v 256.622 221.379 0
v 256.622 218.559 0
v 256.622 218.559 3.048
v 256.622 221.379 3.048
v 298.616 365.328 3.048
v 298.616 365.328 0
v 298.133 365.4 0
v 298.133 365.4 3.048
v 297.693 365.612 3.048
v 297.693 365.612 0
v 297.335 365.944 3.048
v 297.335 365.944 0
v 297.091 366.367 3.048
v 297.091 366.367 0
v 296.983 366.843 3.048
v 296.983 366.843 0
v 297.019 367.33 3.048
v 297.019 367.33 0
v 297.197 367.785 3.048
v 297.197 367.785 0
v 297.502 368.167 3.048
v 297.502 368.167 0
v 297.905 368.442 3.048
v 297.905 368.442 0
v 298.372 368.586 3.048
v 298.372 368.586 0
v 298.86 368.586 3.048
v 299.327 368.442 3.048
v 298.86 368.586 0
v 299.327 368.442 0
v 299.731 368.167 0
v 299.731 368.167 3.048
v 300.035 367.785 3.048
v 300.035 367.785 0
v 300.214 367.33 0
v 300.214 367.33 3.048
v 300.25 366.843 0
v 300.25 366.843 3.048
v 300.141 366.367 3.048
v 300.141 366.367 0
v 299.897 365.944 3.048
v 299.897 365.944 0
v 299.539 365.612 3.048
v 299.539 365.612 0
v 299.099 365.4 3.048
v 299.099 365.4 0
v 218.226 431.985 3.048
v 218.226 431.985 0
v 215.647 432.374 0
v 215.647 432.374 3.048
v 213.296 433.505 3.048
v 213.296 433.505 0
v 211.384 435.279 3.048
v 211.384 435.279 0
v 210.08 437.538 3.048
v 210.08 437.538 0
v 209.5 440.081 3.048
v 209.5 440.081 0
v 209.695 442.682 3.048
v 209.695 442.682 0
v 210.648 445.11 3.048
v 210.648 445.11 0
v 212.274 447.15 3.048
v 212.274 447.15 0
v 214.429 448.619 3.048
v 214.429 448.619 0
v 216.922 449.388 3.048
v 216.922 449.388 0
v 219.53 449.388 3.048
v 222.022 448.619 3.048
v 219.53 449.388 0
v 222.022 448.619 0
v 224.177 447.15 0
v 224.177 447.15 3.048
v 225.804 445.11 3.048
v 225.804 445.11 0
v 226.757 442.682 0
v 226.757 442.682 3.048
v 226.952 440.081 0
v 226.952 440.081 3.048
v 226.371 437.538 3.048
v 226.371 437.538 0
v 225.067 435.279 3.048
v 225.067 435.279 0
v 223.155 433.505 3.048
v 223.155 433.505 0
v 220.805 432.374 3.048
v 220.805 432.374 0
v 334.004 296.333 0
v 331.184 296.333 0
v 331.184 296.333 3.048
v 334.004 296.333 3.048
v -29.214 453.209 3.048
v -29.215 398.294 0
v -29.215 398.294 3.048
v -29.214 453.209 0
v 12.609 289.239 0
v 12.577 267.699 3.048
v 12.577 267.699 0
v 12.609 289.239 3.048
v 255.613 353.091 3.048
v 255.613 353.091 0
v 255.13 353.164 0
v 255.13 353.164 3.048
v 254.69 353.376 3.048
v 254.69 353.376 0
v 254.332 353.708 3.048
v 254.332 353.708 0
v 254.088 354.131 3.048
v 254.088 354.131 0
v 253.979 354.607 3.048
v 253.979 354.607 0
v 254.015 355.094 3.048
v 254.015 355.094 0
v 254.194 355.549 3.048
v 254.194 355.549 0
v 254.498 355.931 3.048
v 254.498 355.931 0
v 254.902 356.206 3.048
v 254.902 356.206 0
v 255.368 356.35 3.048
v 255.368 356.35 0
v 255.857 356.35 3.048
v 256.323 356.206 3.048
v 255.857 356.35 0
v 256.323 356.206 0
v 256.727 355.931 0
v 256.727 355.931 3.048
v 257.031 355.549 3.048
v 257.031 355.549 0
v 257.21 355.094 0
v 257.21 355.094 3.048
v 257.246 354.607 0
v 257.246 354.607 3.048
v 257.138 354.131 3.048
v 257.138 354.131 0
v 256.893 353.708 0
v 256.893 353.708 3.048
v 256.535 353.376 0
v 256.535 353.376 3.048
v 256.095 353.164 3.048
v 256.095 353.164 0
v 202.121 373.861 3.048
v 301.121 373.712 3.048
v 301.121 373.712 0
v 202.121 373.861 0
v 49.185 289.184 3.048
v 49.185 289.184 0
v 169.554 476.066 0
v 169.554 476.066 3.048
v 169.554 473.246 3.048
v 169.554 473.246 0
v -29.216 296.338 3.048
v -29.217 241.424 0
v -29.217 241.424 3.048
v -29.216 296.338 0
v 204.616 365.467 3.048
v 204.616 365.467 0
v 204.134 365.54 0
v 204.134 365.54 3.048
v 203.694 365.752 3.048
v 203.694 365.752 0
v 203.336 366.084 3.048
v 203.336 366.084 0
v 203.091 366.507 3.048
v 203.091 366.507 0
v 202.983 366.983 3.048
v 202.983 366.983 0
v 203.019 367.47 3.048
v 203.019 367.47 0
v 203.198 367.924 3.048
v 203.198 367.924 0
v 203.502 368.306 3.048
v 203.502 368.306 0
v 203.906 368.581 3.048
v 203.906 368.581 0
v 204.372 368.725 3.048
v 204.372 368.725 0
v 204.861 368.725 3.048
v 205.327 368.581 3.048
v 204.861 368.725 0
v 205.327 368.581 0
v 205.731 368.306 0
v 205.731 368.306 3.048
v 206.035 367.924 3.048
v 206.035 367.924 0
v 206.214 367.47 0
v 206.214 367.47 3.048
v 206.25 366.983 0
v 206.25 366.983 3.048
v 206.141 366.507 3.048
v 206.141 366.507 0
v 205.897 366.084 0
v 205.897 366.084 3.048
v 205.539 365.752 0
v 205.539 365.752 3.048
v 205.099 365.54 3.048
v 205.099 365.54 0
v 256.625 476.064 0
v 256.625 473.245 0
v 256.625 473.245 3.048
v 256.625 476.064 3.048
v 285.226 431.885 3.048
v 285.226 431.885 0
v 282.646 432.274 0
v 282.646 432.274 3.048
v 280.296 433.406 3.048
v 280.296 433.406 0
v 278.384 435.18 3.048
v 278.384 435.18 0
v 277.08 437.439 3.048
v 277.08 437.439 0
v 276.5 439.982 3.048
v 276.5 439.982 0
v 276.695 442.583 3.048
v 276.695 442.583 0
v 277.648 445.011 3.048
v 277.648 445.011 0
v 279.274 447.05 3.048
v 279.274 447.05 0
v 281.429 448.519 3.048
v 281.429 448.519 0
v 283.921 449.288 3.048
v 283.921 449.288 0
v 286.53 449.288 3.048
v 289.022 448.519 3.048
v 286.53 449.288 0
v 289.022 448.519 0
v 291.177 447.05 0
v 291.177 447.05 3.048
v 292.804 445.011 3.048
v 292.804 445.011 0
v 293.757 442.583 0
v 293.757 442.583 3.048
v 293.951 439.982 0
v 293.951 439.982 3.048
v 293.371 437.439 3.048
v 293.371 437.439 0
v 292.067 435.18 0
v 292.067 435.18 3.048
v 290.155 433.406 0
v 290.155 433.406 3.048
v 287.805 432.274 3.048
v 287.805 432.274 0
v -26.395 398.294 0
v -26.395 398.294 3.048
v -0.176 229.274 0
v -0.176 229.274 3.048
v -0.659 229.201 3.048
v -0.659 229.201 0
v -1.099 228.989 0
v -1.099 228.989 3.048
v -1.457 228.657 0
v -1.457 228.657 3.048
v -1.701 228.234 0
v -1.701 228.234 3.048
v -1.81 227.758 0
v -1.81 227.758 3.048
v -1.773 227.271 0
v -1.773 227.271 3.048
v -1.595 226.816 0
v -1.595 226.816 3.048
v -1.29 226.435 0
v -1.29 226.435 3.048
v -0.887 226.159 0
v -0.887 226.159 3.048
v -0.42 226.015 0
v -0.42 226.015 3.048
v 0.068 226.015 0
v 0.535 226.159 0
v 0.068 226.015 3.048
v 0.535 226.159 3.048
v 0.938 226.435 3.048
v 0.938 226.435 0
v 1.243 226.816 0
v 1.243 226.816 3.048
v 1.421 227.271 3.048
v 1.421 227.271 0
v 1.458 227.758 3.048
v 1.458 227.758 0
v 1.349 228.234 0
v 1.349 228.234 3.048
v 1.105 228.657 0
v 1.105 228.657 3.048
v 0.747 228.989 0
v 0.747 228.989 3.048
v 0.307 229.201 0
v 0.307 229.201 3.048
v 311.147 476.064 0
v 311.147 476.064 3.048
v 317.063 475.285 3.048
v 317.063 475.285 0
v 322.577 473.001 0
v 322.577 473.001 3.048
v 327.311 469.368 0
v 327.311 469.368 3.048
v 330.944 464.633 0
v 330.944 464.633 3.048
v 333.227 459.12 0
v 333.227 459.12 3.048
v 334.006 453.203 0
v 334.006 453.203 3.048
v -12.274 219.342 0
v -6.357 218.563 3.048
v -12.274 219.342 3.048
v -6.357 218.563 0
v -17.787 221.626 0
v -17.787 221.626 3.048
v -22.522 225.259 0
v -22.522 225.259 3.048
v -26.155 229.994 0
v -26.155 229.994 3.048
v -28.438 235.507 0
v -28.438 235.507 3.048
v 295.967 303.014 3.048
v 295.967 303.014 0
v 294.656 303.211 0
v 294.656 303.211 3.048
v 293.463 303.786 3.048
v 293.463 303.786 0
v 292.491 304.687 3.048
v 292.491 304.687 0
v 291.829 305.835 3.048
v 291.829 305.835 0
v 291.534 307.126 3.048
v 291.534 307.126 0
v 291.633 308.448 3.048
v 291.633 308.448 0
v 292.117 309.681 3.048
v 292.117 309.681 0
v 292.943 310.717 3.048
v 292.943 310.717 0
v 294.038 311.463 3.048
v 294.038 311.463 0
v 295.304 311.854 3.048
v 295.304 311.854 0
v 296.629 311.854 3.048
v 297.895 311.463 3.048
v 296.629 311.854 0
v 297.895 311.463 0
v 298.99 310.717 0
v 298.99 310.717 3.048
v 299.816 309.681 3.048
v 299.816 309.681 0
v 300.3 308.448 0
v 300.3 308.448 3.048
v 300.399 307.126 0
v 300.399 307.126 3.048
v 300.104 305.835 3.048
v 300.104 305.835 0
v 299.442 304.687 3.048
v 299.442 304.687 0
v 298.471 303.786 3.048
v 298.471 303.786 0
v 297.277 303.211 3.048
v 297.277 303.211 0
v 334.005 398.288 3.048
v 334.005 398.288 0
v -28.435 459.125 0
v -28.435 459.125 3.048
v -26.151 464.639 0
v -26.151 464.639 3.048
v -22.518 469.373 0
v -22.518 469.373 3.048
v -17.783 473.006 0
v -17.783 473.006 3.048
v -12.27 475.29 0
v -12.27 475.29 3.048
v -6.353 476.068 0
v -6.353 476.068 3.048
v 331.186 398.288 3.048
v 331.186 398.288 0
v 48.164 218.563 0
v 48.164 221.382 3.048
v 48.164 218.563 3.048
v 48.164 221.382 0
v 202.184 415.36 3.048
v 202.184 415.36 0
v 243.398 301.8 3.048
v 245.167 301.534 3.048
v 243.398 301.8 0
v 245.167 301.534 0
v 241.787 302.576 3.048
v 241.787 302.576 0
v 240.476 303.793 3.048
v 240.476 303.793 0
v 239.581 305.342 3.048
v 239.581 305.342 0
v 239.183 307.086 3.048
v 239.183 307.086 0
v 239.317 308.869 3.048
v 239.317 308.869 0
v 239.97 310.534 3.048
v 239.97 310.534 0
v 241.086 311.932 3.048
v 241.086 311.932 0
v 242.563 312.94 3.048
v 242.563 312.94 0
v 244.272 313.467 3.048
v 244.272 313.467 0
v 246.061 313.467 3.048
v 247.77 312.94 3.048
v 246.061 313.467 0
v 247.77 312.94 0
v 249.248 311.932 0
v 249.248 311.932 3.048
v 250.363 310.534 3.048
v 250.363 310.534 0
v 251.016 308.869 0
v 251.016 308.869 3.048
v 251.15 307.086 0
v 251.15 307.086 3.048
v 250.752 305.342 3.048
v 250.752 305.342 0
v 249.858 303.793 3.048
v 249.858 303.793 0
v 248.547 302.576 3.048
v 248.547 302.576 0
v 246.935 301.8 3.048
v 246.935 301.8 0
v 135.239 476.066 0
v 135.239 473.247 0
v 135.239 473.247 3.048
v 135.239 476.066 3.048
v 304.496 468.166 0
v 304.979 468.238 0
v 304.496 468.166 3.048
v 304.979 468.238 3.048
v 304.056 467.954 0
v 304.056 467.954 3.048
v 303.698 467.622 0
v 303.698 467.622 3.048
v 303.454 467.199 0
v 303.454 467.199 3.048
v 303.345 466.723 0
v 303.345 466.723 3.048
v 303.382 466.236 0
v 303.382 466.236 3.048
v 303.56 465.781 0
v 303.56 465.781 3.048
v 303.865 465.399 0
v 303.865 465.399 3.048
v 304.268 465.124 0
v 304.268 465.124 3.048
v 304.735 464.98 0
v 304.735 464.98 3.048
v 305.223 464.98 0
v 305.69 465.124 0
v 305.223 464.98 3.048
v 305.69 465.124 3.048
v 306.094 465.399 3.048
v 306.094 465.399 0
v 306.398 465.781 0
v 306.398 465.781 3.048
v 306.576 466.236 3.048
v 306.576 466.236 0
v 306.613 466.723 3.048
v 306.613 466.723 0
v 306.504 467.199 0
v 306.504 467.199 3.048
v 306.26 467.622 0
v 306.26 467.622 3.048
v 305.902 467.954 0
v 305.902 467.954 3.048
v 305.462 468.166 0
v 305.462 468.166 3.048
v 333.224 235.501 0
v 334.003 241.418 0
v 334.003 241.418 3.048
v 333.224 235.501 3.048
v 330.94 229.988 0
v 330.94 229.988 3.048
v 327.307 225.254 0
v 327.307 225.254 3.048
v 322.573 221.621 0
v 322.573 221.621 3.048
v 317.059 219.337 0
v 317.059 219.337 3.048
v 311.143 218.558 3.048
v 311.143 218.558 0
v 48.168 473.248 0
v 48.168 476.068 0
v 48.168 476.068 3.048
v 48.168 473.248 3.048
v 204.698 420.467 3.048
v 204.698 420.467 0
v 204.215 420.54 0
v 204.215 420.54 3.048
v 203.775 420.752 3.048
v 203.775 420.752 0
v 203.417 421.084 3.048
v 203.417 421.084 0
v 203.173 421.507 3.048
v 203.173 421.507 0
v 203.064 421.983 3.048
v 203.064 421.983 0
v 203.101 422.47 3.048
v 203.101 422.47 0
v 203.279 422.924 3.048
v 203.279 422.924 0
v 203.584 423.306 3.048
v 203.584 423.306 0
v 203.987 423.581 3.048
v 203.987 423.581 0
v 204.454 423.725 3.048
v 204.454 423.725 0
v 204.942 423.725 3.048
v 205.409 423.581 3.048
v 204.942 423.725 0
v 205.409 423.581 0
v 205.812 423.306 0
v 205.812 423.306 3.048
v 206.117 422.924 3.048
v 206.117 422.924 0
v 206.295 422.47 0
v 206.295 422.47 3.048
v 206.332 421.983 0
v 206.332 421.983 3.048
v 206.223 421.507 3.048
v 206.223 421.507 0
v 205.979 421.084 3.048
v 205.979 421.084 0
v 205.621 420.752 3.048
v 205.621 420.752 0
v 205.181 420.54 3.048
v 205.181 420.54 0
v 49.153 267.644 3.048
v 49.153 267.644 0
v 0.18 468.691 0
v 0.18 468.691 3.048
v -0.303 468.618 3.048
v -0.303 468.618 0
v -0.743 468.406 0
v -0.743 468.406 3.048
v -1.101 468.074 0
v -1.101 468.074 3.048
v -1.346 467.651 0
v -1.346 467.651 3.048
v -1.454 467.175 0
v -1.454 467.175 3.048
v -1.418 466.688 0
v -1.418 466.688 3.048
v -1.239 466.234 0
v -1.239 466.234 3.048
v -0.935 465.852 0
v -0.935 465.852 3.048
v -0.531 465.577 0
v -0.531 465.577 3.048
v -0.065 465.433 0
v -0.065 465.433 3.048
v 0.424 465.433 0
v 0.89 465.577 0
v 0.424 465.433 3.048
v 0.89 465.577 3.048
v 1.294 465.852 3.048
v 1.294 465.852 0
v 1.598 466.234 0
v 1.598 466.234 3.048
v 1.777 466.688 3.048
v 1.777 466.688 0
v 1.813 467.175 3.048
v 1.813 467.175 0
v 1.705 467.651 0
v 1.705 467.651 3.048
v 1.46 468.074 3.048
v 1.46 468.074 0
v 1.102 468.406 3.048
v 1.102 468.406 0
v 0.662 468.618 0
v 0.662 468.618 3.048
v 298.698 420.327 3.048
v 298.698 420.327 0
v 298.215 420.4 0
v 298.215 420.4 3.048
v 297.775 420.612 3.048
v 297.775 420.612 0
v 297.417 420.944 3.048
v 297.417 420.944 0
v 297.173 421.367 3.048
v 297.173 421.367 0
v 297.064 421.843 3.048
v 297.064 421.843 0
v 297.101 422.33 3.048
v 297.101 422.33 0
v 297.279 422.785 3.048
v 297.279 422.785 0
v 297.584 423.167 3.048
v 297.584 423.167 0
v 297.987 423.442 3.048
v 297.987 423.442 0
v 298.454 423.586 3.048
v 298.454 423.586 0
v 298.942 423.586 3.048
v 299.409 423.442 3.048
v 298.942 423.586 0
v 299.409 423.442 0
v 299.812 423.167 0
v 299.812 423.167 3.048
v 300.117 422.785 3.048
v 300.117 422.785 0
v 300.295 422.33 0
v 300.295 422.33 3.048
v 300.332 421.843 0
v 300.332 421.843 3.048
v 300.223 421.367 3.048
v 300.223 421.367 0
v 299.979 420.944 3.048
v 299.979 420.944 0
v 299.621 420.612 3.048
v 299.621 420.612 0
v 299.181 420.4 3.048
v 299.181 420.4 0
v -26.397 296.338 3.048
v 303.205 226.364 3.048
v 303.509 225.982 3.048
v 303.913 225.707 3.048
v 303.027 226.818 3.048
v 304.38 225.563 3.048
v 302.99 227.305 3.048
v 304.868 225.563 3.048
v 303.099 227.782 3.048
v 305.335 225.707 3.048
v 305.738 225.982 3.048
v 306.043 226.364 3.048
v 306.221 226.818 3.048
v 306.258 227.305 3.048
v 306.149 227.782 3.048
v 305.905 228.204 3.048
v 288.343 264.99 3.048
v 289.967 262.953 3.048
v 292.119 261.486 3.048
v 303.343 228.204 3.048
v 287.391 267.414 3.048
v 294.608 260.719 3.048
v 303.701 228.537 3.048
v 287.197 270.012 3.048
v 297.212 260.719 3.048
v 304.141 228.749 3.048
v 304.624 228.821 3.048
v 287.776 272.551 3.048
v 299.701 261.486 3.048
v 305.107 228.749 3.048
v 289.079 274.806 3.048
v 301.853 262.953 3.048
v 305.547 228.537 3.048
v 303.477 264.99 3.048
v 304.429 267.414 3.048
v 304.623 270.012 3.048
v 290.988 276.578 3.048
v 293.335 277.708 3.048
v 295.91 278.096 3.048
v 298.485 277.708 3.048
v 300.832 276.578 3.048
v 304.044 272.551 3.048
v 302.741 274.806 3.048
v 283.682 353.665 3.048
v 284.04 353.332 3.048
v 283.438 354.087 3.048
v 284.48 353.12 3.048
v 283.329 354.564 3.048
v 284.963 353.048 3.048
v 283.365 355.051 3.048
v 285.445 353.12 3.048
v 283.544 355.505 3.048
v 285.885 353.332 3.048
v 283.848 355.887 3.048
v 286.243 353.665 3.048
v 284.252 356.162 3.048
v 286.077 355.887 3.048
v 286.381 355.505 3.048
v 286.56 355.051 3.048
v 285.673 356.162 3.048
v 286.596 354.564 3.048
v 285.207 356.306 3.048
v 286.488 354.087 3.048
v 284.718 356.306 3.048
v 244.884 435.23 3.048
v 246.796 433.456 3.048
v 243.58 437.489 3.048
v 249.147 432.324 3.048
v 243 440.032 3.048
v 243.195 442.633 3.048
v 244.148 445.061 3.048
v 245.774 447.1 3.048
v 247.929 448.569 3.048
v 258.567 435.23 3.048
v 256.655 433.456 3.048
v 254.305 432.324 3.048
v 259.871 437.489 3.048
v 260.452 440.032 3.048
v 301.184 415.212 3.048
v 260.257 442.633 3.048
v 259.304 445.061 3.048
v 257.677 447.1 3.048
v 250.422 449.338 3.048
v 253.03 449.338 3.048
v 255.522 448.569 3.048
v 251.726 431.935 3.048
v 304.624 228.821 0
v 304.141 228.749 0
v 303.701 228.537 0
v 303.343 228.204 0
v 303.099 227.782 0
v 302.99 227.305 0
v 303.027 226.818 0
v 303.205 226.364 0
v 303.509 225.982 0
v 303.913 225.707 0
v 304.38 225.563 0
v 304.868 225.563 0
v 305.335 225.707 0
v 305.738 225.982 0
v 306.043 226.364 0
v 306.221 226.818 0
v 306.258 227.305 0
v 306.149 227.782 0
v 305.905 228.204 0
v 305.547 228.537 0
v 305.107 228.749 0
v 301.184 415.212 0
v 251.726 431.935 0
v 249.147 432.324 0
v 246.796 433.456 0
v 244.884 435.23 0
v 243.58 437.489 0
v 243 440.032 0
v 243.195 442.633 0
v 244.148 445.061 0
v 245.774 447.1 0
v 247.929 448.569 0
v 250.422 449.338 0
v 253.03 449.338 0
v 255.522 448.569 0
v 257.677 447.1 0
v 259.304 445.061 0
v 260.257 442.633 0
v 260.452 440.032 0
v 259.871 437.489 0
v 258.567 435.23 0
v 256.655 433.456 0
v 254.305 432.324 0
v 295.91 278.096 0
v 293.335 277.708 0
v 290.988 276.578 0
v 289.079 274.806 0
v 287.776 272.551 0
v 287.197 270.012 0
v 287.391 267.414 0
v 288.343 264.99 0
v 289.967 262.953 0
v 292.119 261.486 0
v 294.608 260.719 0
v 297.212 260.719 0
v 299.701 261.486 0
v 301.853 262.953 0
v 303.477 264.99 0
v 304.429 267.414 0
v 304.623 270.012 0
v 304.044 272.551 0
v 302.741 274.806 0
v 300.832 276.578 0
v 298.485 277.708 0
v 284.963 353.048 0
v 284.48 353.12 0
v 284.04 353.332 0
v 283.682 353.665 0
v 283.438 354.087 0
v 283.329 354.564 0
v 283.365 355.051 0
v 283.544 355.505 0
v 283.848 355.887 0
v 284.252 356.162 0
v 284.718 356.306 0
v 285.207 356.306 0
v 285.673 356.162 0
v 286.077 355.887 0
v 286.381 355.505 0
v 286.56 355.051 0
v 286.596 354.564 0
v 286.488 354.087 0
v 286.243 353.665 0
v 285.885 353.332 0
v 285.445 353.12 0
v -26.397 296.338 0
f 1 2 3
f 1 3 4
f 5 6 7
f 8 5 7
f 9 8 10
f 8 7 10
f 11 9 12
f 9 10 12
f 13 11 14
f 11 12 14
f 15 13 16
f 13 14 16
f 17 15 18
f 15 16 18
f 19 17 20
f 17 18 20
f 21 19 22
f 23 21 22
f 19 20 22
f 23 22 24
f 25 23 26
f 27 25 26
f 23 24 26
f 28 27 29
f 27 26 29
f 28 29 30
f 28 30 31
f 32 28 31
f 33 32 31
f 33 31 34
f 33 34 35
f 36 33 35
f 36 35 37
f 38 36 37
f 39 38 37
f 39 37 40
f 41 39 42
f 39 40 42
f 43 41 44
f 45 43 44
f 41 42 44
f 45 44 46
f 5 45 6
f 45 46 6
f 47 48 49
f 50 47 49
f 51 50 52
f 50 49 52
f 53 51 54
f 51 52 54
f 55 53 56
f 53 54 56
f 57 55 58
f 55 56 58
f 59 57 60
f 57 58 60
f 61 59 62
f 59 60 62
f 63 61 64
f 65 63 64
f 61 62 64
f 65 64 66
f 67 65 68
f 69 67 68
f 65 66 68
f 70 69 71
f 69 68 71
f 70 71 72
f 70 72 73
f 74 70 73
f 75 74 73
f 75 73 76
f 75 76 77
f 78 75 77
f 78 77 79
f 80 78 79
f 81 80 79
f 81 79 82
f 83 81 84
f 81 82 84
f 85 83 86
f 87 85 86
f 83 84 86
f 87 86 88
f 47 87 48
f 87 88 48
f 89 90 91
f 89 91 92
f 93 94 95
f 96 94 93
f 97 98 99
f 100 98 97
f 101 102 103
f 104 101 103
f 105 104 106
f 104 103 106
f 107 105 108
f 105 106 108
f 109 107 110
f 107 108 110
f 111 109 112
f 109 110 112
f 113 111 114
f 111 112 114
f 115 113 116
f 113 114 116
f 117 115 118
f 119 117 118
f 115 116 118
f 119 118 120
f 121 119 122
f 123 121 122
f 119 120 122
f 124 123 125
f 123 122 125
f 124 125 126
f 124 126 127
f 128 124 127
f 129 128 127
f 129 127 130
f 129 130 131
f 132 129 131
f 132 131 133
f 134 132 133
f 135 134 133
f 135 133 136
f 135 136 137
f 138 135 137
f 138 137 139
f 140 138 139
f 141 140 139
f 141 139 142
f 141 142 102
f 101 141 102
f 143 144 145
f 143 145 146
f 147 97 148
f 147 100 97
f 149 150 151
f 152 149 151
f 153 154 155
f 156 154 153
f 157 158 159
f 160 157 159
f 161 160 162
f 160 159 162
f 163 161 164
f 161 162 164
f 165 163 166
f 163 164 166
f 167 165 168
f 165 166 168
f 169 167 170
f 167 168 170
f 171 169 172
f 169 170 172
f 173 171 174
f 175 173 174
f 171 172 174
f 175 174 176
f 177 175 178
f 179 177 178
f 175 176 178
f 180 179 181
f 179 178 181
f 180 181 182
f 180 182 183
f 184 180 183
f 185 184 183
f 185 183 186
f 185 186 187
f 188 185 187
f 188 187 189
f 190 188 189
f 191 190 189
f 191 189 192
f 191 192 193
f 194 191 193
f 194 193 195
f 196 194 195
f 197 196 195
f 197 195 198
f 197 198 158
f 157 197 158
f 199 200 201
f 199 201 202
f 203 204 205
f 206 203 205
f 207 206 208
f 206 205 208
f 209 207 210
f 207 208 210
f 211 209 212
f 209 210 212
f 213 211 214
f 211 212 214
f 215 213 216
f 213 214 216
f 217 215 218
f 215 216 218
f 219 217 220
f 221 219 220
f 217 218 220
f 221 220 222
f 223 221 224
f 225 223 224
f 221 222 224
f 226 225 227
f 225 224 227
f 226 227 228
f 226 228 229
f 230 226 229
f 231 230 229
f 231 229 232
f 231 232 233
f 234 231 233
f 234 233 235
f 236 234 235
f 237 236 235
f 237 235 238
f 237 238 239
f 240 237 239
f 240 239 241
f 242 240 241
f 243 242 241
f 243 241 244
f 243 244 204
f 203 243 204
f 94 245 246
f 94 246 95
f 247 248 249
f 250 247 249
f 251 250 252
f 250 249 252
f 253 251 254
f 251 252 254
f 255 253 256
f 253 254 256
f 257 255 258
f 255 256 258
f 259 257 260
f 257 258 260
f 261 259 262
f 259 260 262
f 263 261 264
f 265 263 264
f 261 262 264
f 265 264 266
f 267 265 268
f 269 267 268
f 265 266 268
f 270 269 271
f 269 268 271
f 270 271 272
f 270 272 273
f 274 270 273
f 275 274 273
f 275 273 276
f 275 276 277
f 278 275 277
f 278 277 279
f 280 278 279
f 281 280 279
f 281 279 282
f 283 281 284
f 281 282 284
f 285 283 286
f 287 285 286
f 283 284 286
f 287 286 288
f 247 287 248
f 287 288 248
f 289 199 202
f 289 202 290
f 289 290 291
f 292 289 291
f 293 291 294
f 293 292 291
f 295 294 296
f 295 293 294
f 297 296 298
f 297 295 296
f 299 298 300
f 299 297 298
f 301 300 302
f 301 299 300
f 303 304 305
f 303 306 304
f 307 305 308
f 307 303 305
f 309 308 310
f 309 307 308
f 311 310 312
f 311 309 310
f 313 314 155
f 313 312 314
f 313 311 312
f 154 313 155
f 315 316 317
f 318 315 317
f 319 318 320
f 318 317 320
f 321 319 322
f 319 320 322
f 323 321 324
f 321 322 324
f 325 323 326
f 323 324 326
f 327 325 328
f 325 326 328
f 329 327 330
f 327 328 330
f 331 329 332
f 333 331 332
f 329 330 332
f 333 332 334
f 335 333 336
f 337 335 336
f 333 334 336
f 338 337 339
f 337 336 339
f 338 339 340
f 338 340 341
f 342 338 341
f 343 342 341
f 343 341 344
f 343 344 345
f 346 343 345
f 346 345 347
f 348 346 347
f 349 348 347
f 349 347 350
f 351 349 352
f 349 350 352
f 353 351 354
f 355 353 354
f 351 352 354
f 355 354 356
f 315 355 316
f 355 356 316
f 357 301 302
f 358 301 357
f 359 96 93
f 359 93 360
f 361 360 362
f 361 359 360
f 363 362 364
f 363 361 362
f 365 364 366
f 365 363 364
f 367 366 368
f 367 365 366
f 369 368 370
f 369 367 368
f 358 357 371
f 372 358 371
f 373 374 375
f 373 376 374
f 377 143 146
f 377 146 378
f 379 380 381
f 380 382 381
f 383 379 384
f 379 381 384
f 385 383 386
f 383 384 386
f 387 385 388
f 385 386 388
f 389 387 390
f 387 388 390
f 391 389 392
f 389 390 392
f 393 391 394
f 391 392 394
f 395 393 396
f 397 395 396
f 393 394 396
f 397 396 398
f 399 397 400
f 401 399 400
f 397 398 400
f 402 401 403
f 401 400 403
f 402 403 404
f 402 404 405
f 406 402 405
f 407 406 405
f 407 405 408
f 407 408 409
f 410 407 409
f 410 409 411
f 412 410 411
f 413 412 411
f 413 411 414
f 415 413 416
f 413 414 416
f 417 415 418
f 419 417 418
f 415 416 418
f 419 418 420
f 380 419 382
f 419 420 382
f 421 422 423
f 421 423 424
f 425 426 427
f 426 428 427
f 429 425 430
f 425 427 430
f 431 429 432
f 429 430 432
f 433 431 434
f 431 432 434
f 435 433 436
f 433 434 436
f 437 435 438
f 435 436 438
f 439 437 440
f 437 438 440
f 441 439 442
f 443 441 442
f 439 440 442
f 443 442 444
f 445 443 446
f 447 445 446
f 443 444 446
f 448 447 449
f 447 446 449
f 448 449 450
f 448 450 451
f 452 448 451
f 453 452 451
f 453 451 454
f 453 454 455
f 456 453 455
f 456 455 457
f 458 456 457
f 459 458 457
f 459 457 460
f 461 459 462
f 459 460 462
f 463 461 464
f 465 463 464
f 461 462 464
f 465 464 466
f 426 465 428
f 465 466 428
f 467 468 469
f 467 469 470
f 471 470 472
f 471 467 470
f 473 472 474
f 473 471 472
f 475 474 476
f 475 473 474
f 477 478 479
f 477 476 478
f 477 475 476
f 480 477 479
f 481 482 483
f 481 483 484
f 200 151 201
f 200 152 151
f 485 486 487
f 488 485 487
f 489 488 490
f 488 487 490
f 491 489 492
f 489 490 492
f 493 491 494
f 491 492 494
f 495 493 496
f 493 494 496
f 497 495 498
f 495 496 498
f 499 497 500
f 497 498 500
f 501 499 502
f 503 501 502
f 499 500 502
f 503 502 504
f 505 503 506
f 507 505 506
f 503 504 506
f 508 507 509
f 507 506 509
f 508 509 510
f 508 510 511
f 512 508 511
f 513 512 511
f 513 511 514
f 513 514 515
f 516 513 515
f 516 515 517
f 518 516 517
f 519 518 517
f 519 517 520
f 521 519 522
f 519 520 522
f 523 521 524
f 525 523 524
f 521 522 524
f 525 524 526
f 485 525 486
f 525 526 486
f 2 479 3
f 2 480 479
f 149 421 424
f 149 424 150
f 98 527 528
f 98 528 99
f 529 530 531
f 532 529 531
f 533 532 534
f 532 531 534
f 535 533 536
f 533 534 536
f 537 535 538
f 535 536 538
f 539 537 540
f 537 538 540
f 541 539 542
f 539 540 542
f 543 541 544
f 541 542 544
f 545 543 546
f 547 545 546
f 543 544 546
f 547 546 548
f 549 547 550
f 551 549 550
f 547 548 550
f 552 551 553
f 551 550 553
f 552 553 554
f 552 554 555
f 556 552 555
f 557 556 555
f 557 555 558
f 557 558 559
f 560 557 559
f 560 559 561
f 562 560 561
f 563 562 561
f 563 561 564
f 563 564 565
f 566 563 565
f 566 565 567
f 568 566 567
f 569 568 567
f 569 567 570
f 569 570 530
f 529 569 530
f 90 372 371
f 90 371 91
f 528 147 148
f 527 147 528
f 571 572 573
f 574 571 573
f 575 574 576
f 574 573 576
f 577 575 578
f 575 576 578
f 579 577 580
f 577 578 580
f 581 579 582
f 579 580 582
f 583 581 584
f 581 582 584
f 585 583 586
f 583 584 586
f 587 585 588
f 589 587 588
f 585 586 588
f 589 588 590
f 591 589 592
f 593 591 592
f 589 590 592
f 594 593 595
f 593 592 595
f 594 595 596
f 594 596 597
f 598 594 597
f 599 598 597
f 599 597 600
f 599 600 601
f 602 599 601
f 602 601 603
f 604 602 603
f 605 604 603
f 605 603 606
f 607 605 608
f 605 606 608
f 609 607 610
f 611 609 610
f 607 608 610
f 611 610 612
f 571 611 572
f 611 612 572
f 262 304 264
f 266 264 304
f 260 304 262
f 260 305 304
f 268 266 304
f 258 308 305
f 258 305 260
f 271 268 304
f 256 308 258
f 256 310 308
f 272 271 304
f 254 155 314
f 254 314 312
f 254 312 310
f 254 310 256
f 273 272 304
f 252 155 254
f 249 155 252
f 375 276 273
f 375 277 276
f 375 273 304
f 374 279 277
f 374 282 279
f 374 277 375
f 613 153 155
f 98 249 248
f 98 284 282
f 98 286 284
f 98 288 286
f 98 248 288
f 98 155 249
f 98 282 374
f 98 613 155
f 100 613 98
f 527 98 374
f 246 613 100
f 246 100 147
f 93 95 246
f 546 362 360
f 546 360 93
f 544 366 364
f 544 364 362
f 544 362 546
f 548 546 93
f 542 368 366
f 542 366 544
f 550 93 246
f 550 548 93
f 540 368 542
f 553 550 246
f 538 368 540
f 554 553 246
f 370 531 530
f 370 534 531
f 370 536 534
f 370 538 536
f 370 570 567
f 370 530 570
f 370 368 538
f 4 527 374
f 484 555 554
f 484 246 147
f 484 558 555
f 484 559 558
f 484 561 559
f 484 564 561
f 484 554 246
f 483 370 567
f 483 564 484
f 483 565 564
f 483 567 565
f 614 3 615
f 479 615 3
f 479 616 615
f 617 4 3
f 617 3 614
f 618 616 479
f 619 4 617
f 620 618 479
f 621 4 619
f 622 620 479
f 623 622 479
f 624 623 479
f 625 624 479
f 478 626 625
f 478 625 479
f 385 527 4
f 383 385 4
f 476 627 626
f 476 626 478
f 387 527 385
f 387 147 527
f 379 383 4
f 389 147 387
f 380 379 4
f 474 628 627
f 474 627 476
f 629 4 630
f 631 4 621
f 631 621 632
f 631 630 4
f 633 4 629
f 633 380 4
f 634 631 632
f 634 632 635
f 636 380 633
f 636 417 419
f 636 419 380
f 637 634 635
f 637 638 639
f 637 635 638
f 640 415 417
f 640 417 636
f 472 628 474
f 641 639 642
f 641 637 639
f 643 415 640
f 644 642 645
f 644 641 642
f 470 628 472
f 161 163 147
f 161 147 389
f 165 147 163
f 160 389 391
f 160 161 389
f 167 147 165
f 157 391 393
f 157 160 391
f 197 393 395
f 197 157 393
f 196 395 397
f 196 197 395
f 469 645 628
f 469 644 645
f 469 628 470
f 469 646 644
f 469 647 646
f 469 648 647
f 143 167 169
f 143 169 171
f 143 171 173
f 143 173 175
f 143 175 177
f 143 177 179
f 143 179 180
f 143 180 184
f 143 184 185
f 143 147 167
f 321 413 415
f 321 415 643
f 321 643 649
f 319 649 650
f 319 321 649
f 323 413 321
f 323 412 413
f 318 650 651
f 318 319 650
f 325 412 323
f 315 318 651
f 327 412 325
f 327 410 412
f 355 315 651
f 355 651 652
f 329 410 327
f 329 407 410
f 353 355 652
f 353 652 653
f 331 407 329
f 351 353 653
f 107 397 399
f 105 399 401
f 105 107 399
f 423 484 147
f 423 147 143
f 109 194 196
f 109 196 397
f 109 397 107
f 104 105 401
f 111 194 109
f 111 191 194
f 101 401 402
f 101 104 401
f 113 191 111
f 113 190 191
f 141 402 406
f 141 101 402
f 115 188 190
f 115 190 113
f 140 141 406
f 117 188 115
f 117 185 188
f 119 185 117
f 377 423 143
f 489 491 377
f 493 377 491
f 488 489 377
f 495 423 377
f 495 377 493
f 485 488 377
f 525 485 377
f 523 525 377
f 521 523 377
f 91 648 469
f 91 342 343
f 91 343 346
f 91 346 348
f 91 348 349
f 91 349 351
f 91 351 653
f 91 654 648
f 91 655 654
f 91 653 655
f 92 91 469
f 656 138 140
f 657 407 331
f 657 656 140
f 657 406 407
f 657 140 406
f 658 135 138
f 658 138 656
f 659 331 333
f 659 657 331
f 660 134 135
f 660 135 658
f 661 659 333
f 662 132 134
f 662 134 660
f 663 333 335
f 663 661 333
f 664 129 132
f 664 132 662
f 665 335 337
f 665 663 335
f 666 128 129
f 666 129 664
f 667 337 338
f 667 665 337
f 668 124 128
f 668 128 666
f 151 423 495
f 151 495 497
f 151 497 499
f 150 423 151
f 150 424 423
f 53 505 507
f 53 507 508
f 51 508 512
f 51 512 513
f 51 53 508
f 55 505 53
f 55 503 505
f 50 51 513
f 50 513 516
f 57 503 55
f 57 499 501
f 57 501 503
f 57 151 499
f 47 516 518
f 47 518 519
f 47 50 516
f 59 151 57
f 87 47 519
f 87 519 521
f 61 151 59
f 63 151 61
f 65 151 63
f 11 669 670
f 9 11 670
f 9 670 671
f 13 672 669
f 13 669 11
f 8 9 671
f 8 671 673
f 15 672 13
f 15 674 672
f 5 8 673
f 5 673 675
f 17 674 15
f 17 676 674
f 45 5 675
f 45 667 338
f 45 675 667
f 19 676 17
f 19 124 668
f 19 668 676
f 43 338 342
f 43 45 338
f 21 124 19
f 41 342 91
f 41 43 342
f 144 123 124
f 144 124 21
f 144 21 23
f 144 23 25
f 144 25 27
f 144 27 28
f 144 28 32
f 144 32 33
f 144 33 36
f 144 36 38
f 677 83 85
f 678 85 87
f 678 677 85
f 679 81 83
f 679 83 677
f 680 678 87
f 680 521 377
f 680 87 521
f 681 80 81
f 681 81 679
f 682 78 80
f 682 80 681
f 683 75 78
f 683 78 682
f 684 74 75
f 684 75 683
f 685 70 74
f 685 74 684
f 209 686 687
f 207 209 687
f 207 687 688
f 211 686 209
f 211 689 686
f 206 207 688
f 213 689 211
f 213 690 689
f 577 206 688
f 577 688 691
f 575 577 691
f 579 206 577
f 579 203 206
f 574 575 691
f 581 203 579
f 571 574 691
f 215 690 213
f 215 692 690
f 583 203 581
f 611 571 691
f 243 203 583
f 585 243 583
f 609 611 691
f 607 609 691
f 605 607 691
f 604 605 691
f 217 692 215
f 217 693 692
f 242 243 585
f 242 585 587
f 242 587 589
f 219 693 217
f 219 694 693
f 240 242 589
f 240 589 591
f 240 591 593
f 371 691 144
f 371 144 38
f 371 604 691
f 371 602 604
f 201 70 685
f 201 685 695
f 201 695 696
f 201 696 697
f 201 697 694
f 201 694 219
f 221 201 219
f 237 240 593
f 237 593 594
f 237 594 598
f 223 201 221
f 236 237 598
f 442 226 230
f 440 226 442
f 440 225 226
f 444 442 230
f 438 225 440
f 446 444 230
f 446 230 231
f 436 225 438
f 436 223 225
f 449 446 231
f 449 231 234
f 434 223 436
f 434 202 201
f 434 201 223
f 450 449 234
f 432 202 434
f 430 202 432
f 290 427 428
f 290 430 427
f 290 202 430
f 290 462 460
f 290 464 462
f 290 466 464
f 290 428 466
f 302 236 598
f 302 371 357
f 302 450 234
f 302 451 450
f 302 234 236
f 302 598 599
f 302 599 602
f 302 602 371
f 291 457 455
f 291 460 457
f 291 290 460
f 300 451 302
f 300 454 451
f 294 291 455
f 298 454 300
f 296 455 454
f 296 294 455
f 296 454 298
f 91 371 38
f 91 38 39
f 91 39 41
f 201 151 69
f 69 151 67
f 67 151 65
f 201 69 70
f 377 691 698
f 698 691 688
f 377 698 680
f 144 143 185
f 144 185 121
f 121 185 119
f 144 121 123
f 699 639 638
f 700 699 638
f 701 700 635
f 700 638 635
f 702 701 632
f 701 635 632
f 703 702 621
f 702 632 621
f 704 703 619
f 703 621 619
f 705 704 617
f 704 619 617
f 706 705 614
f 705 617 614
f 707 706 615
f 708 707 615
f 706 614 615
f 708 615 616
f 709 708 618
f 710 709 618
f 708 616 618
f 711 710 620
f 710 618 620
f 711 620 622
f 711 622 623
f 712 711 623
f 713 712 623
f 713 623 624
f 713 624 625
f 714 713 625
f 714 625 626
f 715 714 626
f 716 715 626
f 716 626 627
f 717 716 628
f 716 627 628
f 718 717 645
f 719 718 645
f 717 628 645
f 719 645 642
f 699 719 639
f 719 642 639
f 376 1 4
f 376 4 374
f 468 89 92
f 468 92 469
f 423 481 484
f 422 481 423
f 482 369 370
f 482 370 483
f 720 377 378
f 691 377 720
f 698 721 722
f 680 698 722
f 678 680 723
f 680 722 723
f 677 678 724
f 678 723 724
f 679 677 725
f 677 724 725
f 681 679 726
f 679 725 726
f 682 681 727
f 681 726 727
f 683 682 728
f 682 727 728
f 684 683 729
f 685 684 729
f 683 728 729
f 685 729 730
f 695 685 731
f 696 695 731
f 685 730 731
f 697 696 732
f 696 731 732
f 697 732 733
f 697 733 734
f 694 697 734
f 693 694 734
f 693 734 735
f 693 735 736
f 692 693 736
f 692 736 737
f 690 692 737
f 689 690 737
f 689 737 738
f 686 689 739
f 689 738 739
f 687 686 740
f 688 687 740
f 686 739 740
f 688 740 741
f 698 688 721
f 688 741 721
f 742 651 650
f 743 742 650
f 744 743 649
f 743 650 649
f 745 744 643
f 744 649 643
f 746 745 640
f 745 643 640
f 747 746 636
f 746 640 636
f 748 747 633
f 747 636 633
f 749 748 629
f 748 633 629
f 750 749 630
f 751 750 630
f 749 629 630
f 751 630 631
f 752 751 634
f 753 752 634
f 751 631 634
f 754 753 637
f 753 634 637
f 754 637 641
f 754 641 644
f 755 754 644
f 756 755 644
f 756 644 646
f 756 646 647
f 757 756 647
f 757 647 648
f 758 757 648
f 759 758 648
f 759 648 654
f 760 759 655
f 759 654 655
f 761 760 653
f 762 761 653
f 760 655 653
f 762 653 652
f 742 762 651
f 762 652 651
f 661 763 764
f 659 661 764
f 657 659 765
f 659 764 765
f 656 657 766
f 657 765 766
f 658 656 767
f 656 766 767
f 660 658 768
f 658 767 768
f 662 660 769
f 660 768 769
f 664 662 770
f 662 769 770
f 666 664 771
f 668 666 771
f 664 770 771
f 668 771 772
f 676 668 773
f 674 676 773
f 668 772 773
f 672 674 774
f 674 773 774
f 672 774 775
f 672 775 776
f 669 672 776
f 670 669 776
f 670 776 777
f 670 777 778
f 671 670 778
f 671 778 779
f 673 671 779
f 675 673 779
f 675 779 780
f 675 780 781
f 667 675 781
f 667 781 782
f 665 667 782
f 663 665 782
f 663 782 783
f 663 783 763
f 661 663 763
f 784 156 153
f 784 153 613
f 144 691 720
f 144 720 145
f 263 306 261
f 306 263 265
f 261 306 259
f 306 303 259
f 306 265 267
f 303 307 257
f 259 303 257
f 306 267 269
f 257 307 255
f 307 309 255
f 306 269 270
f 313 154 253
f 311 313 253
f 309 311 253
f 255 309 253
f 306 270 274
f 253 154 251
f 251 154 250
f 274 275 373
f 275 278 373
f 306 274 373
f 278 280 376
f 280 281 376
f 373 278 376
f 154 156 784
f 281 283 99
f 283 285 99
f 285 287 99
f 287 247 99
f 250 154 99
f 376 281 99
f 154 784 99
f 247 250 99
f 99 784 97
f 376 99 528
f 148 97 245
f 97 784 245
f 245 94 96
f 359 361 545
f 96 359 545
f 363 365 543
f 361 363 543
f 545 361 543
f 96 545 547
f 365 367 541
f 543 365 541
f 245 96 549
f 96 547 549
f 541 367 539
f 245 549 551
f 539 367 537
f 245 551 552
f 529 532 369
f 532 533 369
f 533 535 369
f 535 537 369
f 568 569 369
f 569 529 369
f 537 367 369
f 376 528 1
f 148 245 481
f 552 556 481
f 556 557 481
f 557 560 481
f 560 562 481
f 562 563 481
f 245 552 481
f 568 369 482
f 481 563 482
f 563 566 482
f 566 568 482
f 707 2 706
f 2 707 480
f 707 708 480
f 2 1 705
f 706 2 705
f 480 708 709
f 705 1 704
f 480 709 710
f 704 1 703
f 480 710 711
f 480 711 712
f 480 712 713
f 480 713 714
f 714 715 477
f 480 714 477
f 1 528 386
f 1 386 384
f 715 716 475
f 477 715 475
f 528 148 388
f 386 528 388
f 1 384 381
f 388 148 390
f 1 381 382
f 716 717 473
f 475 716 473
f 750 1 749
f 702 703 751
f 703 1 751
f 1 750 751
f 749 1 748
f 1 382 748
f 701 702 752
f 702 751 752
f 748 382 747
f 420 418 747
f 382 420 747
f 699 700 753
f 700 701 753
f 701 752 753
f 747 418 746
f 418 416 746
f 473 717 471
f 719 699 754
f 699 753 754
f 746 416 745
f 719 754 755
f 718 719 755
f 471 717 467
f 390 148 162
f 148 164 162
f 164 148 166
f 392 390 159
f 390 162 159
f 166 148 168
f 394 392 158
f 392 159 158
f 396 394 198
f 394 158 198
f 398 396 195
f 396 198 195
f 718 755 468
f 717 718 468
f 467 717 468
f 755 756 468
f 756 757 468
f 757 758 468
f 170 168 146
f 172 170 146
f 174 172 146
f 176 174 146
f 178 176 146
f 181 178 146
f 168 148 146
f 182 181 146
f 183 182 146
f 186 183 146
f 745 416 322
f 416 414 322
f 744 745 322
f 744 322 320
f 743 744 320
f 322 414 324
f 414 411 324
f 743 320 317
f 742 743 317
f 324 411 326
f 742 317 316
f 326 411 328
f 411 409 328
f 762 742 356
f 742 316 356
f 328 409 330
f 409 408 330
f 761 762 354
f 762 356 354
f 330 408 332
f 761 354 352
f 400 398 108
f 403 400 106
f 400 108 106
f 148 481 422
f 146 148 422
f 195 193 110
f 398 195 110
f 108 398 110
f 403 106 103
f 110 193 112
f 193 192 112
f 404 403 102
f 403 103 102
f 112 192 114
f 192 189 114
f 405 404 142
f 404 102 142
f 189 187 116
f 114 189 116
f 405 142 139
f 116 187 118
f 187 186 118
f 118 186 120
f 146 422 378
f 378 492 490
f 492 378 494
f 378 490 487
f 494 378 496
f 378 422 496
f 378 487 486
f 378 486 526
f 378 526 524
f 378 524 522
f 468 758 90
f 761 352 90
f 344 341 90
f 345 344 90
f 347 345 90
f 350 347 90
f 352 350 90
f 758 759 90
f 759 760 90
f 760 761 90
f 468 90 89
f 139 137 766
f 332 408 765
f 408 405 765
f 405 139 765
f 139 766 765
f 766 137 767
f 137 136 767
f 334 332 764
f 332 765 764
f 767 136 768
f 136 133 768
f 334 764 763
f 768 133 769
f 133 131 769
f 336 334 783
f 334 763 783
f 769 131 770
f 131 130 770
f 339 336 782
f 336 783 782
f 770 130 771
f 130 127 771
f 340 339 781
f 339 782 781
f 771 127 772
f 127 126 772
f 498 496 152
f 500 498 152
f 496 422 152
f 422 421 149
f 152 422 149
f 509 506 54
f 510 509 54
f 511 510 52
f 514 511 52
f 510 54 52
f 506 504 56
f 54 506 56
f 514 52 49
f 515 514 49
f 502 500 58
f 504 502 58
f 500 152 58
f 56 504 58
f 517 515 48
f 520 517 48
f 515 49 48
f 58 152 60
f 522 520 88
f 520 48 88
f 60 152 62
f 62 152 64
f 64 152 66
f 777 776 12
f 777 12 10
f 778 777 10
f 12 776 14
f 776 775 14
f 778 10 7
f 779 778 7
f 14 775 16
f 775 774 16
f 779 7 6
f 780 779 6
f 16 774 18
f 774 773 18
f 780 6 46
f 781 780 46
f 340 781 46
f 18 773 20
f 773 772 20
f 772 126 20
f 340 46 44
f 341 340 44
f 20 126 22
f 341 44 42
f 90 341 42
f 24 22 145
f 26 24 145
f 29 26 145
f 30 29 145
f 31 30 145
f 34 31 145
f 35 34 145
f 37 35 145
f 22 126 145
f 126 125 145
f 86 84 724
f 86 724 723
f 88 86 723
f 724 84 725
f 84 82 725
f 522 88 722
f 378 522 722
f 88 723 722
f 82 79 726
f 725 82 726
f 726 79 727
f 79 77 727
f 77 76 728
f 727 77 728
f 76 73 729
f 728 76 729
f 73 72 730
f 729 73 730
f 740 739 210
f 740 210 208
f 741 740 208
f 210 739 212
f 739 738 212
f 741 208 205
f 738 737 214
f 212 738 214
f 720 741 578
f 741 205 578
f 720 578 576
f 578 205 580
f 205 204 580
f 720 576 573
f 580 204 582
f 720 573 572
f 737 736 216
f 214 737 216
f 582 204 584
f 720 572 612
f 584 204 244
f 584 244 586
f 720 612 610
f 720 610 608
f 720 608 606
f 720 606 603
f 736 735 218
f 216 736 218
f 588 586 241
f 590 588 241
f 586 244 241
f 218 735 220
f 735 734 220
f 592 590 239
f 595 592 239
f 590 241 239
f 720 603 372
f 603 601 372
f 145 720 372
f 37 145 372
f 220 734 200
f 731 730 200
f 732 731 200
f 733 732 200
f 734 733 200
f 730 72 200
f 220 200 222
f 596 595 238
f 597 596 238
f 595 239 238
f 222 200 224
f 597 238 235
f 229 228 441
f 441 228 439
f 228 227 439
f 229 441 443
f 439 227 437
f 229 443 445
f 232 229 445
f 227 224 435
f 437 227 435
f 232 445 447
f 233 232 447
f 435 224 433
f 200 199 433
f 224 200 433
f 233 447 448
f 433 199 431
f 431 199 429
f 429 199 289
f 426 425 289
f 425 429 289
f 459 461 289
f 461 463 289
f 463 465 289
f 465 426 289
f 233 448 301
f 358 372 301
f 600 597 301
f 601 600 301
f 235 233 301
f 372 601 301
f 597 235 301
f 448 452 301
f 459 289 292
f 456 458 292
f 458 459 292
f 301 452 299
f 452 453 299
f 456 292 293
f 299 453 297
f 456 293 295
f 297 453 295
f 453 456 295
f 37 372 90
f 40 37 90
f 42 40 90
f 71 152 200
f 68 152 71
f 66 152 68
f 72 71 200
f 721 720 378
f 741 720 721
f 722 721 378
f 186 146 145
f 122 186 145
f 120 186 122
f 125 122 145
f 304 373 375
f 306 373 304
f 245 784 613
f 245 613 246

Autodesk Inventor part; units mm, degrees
ref_plane "YZ Plane" through (0, 0, 0) normal (1, 0, 0) x (0, 1, 0)
ref_plane "XZ Plane" through (0, 0, 0) normal (0, 1, 0) x (-1, 0, 0)
ref_plane "Work Plane1" through (300.7927, 694.1728, 0) normal (0, 0, 1) x (1, -0.0015, 0)
sketch "Sketch1" plane through (300.7927, 694.1728, 0) normal (0, 0, 1) x (1, -0.0015, 0)
  line L0 (11.0652, -476.8683) -> (-44.7258, -476.9512) construction
  arc A0 (11.0652, -476.8683) -> (35.1594, -452.7025) centre (11.0294, -452.7384) ccw construction
  line L1 (35.0759, -396.5178) -> (35.1594, -452.7025) construction
  line L2 (32.2566, -396.522) -> (35.0759, -396.5178) construction
  line L3 (32.109, -297.1065) -> (32.2566, -396.522) construction
  line L4 (34.9284, -297.1023) -> (32.109, -297.1065) construction
  line L5 (34.845, -240.9176) -> (34.9284, -297.1023) construction
  arc A1 (34.845, -240.9176) -> (10.6792, -216.8234) centre (10.715, -240.9534) ccw construction
  line L6 (-45.1119, -216.9062) -> (10.6792, -216.8234) construction
  line L7 (-45.1077, -219.7256) -> (-45.1119, -216.9062) construction
  line L8 (-129.6388, -219.8511) -> (-45.1077, -219.7256) construction
  line L9 (-129.643, -217.0317) -> (-129.6388, -219.8511) construction
  line L10 (-166.4983, -217.0864) -> (-129.643, -217.0317) construction
  line L11 (-166.4942, -219.9058) -> (-166.4983, -217.0864) construction
  line L12 (-251.0253, -220.0313) -> (-166.4942, -219.9058) construction
  line L13 (-251.0295, -217.2119) -> (-251.0253, -220.0313) construction
  line L14 (-306.8205, -217.2948) -> (-251.0295, -217.2119) construction
  arc A2 (-306.8205, -217.2948) -> (-330.9146, -241.4606) centre (-306.7847, -241.4247) ccw construction
  line L15 (-330.8312, -297.6453) -> (-330.9146, -241.4606) construction
  line L16 (-328.0118, -297.6411) -> (-330.8312, -297.6453) construction
  line L17 (-327.8643, -397.0566) -> (-328.0118, -297.6411) construction
  line L18 (-330.6836, -397.0608) -> (-327.8643, -397.0566) construction
  line L19 (-330.6002, -453.2455) -> (-330.6836, -397.0608) construction
  arc A3 (-330.6002, -453.2455) -> (-306.4344, -477.3397) centre (-306.4703, -453.2097) ccw construction
  line L20 (-250.6434, -477.2569) -> (-306.4344, -477.3397) construction
  line L21 (-250.6476, -474.4375) -> (-250.6434, -477.2569) construction
  line L22 (-44.73, -474.1318) -> (-250.6476, -474.4375) construction
  line L23 (-44.7258, -476.9512) -> (-44.73, -474.1318) construction
  circle A4 centre (4.6999, -466.5639) radius 1.0795 construction
  circle A5 centre (-300.0998, -467.0164) radius 1.0795 construction
  circle A6 centre (-300.4552, -227.5992) radius 1.0795 construction
  circle A7 centre (4.3445, -227.1467) radius 1.0795 construction
  line L24 (-251.9195, -473.1693) -> (-251.9153, -475.9887)
  line L25 (-251.9153, -475.9887) -> (-306.4363, -476.0697)
  arc A8 (-329.3302, -453.2436) -> (-306.4363, -476.0697) centre (-306.4703, -453.2097) ccw
  line L26 (-329.3302, -453.2436) -> (-329.4118, -398.3289)
  line L27 (-329.4118, -398.3289) -> (-326.5924, -398.3247)
  line L28 (-326.5924, -398.3247) -> (-326.7437, -296.3692)
  line L29 (-326.7437, -296.3692) -> (-329.5631, -296.3734)
  line L30 (-329.5631, -296.3734) -> (-329.6446, -241.4587)
  arc A9 (-306.8186, -218.5648) -> (-329.6446, -241.4587) centre (-306.7847, -241.4247) ccw
  line L31 (-306.8186, -218.5648) -> (-252.2976, -218.4838)
  line L32 (-252.2976, -218.4838) -> (-252.2934, -221.3032)
  line L33 (-252.2934, -221.3032) -> (-165.2223, -221.174)
  line L34 (-165.2223, -221.174) -> (-165.2265, -218.3546)
  line L35 (-165.2265, -218.3546) -> (-130.9111, -218.3036)
  line L36 (-130.9111, -218.3036) -> (-130.9069, -221.123)
  line L37 (-130.9069, -221.123) -> (-43.8358, -220.9938)
  line L38 (-43.8358, -220.9938) -> (-43.84, -218.1744)
  line L39 (-43.84, -218.1744) -> (10.681, -218.0934)
  arc A10 (33.575, -240.9195) -> (10.681, -218.0934) centre (10.715, -240.9534) ccw
  line L40 (33.575, -240.9195) -> (33.6565, -295.8342)
  line L41 (33.6565, -295.8342) -> (30.8371, -295.8384)
  line L42 (30.8371, -295.8384) -> (30.9884, -397.7939)
  line L43 (30.9884, -397.7939) -> (33.8078, -397.7897)
  line L44 (33.8078, -397.7897) -> (33.8894, -452.7044)
  arc A11 (11.0633, -475.5983) -> (33.8894, -452.7044) centre (11.0294, -452.7384) ccw
  line L45 (11.0633, -475.5983) -> (-43.4577, -475.6793)
  line L46 (-43.4577, -475.6793) -> (-43.4619, -472.8599)
  line L47 (-43.4619, -472.8599) -> (-251.9195, -473.1693)
  dimension "d32" = 1.27
extrude "Plate1" add sketch "Sketch1" along normal blind 3.048
sketch "Sketch3" plane through (300.7927, 694.1728, 0) normal (0, 0, -1) x (-1, 0.0015, 0)
  circle A0 centre (300.2757, -466.9836) radius 1.0795 construction
  circle A1 centre (-4.5243, -466.9836) radius 1.0795 construction
  circle A2 centre (-4.5243, -227.5661) radius 1.0795 construction
  circle A3 centre (300.2757, -227.5661) radius 1.0795 construction
  line L0 (-4.5243, -227.5661) -> (300.2757, -227.5661) construction
  line L1 (300.2757, -227.5661) -> (300.2757, -466.9836) construction
  line L2 (300.2757, -466.9836) -> (-4.5243, -466.9836) construction
  line L3 (-4.5243, -466.9836) -> (-4.5243, -227.5661) construction
  line L4 (326.5924, -398.3247) -> (326.7437, -296.3692) construction
  line L5 (326.668, -347.347) -> (300.2757, -347.2749) construction
  line L6 (43.4619, -472.8599) -> (251.9195, -473.1693) construction
  line L7 (165.2265, -218.3546) -> (130.9111, -218.3036) construction
  line L8 (-4.5243, -347.2749) -> (-30.9128, -346.8161) construction
  line L9 (-30.8371, -295.8384) -> (-30.9884, -397.7939) construction
  point P0 (152.4, -347.3112)
  dimension "d2" = 304.8
  dimension "d3" = 239.4175
hole "Mounting_Holes" at (0.1795, 467.0527, 0) at (-0.1759, 227.6355, 0) at (304.6238, 227.183, 0) at (304.9792, 466.6002, 0) direction (0, 0, 1) diameter 3.2766 end through all clearance for "Flat Head Machine Screw (82)" size "#4" standard "Ansi Unified Screw Threads"
sketch "Sketch4" plane through (300.7927, 694.1728, 0) normal (0, 0, -1) x (-1, 0.0015, 0)
  circle A0 centre (4.2521, -424.821) radius 10.541 construction
  line L0 (-33.575, -240.9195) -> (-33.6565, -295.8342) projected
  line L1 (43.84, -218.1744) -> (-10.681, -218.0934) projected
  line L2 (-11.0633, -475.5983) -> (43.4577, -475.6793) projected
  dimension "d11" = 21.082
  dimension "d33" = 38.1
  dimension "d86" = 50.8
hole "Power_Connector" at (295.91, 269.3586, 0) direction (0, 0, 1) diameter 17.4752 end through all thread size "1/2" designation "1/2 - 14 NPT" standard "NPT for PVC Pipe and Fitting"
sketch "Sketch7" plane through (300.7927, 694.1728, 3.048) normal (0, 0, 1) x (1, -0.0015, 0)
  line L0 (0.8093, -320.4599) -> (-98.1907, -320.4599)
  line L1 (-98.1907, -320.4599) -> (-98.1907, -278.9599)
  line L2 (-98.1907, -278.9599) -> (0.8093, -278.9599)
  line L3 (0.8093, -278.9599) -> (0.8093, -320.4599)
  line L4 (-165.2265, -218.3546) -> (-130.9111, -218.3036) construction
  line L5 (-43.4619, -472.8599) -> (-251.9195, -473.1693) construction
  line L6 (-43.4619, -472.8599) -> (-251.9195, -473.1693) construction
  line L7 (-147.6907, -473.0146) -> (-147.7272, -448.3951) construction
  point P0 (-299.7619, -694.6186)
  dimension "d40" = 99
  dimension "d41" = 41.5
  dimension "d80" = 152.4
  dimension "d81" = 49.5
extrude "LCD_Cutout" cut sketch "Sketch7" against normal through all
sketch "Sketch8" plane through (300.7927, 694.1728, 3.048) normal (0, 0, 1) x (1, -0.0015, 0)
  line L0 (-1.6907, -327.2099) -> (-95.6907, -327.2099) construction
  line L1 (-95.6907, -327.2099) -> (-95.6907, -272.2099) construction
  line L2 (-95.6907, -272.2099) -> (-1.6907, -272.2099) construction
  line L3 (-1.6907, -272.2099) -> (-1.6907, -327.2099) construction
  line L4 (-48.6907, -327.2099) -> (-48.6907, -320.4599) construction
  line L5 (0.8093, -320.4599) -> (-98.1907, -320.4599) construction
  line L6 (-98.1907, -278.9599) -> (0.8093, -278.9599) construction
  line L7 (-48.6907, -278.9599) -> (-48.6907, -272.2099) construction
  point P0 (-299.7619, -694.6186)
  dimension "d45" = 94
  dimension "d46" = 55
hole "LCD_Holes" at (298.6163, 366.9658, 3.048) at (204.6164, 367.1053, 3.048) at (204.698, 422.1053, 3.048) at (298.6979, 421.9657, 3.048) direction (0, 0, -1) diameter 3.2766 end through all clearance for "Socket Head Cap Screw" size "#4" standard "Ansi Unified Screw Threads"
sketch "Sketch9" plane through (300.7927, 694.1728, 3.048) normal (0, 0, 1) x (1, -0.0015, 0)
  circle A0 centre (-4.2521, -424.821) radius 9.0607 projected
  line L0 (30.8371, -295.8384) -> (30.9884, -397.7939) projected
  point P0 (-299.7619, -694.6186)
  point P1 (-55.0521, -386.721)
  dimension "d84" = 50.8
  dimension "d85" = 38.1
hole "Pickle_Switch" at (245.1666, 307.5339, 3.048) direction (0, 0, -1) diameter 12 end through all
sketch "Sketch10" plane through (300.7927, 694.1728, 3.048) normal (0, 0, 1) x (1, -0.0015, 0)
  line L0 (-15.1907, -253.5599) -> (-82.1907, -253.5599) construction
  line L1 (-98.1907, -278.9599) -> (0.8093, -278.9599) construction
  line L2 (-48.6907, -278.9599) -> (-48.6907, -253.5599) construction
  line L3 (0.8093, -278.9599) -> (0.8093, -320.4599) construction
  point P0 (-299.7619, -694.6186)
  dimension "d62" = 16
  dimension "d63" = 25.4
hole "Pushbuttons" at (285.2256, 440.6357, 3.048) at (251.7257, 440.6855, 3.048) at (218.2257, 440.7352, 3.048) direction (0, 0, -1) diameter 17.5006 end through all clearance for "Hex Head Cap Screw ISO 24017" size "M16" standard "ISO"
sketch "Sketch11" plane through (300.7927, 694.1728, 3.048) normal (0, 0, 1) x (1, -0.0015, 0)
  circle A0 centre (-4.2521, -424.821) radius 9.0607 construction
  circle A1 centre (-55.0521, -386.721) radius 6 construction
  line L0 (-4.2521, -424.821) -> (-4.2521, -386.721) construction
  point P0 (-299.7619, -694.6186)
  dimension "d71" = 38.1
hole "Air_Coupler" at (295.9666, 307.4585, 3.048) direction (0, 0, -1) diameter 8.89 depth 3.048 tip angle 118
sketch "Sketch12" plane through (300.7927, 694.1728, 3.048) normal (0, 0, 1) x (1, -0.0015, 0)
  line L0 (-250.9997, -426.9053) -> (-287.5757, -426.9053)
  line L1 (-287.5757, -426.9053) -> (-287.5757, -405.3661)
  line L2 (-287.5757, -405.3661) -> (-250.9997, -405.3661)
  line L3 (-250.9997, -405.3661) -> (-250.9997, -426.9053)
  circle A0 centre (-300.2757, -227.5661) radius 1.6383 construction
  point P0 (-299.7619, -694.6186)
  dimension "d87" = 36.576
  dimension "d88" = 21.5392
  dimension "d89" = 177.8
  dimension "d90" = 12.7
extrude "Powerpole_Cutout" cut sketch "Sketch12" against normal blind 3.048
sketch "Sketch13" plane through (300.7927, 694.1728, 3.048) normal (0, 0, 1) x (1, -0.0015, 0)
  line L0 (-15.3261, -339.5099) -> (-44.6761, -339.5099) construction
  line L1 (30.8371, -295.8384) -> (30.9884, -397.7939) construction
  line L2 (0.8093, -320.4599) -> (-98.1907, -320.4599) construction
  point P0 (-299.7619, -694.6186)
  dimension "d93" = 46.228
  dimension "d94" = 29.35
  dimension "d95" = 19.05
hole "Fan Bracket" at (284.9626, 354.686, 3.048) at (255.6126, 354.7296, 3.048) direction (0, 0, -1) diameter 3.2766 end through all clearance for "Socket Head Cap Screw" size "#4" standard "Ansi Unified Screw Threads"
equation "\"d9\" = Thickness"
equation "\"d43\" = Thickness"
equation "\"d45\" = LCD_PCB_Horizontal_Hole_Spacing"
equation "\"d46\" = LCD_PCB_Vertical_Hole_Spacing"
equation "\"d47\" = LCD_Cover_Hole_Diameter"
equation "\"d60\" = Thickness"
equation "\"d69\" = Thickness"
equation "\"d77\" = Thickness"
equation "\"d91\" = Thickness"
equation "\"d94\" = Bracket_Hole_Spacing"
equation "\"d101\" = Thickness"
equation "\"d81\" = 0.5 * d40"
equation "\"BendRadius\" = Thickness"
equation "\"BendReliefWidth\" = Thickness"
equation "\"BendReliefDepth\" = 0.5 * Thickness"
equation "\"CornerReliefSize\" = 4 * Thickness"
equation "\"MinimumRemnant\" = 2 * Thickness"
equation "\"TransitionRadius\" = BendRadius"
equation "\"JacobiRadiusSize\" = BendRadius"
equation "\"GapSize\" = Thickness"
equation "\"d1\" = BendRadius"
equation "\"Thickness\" = 3.048"
equation "\"LCD_PCB_Horizontal_Hole_Spacing\" = 94"
equation "\"LCD_PCB_Vertical_Hole_Spacing\" = 55"
equation "\"LCD_Cover_Hole_Diameter\" = 3.2766"
equation "\"Bracket_Hole_Spacing\" = 29.35"
properties part number "Panel" material "Acetal Resin, Black"
